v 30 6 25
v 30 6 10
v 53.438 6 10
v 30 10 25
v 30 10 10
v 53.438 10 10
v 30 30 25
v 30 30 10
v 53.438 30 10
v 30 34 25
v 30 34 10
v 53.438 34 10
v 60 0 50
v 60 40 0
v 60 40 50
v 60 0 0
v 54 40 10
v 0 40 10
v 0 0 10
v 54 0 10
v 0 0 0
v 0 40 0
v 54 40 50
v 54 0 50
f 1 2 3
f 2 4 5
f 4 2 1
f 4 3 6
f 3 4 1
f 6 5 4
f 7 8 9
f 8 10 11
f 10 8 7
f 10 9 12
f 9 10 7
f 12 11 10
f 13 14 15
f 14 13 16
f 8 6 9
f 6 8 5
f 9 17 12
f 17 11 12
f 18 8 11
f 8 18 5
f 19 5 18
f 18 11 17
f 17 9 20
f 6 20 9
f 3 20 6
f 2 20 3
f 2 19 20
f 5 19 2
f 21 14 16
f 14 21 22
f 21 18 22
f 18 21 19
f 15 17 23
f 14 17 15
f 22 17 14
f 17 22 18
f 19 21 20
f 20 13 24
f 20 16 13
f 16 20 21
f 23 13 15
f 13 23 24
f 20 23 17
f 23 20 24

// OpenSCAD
$fn = 32;

// ----------------------------------------------------------------------
// Rib bracket: 2-gusset L bracket
// ----------------------------------------------------------------------

// --- parameters (mm) ---
base_l = 60;              // foot length, X
base_w = 40;              // foot width, Y
base_t = 10;              // foot thickness
plate_t = 6;              // upright plate thickness
plate_h = 50;             // overall height
gus_l = 24;               // gusset leg along the foot
gus_h = 16;               // gusset height
gus_t = 4;                // gusset thickness
gus_edge = 6;             // gusset margin from the foot edge
n_gus = 2;                // gusset count
fit_tol = 0.05;           // tolerance for press fits, mm
free_tol = 0.2;           // tolerance for clearance fits, mm

gus_pitch = (base_w - 2 * gus_edge - gus_t) / (n_gus - 1);  // gusset pitch

union() {
  cube([base_l, base_w, base_t]);
  translate([base_l - plate_t, 0, base_t - 1])
    cube([plate_t, base_w, plate_h - base_t + 1]);
  for (i = [0 : n_gus - 1])
    translate([base_l - plate_t - gus_l, gus_edge + i * gus_pitch, base_t - 1])
      rotate([-90, 0, 0])
        linear_extrude(height = gus_t)
          polygon(points = [[0, 0], [gus_l + 1, 0], [0, -gus_h]]);
}
